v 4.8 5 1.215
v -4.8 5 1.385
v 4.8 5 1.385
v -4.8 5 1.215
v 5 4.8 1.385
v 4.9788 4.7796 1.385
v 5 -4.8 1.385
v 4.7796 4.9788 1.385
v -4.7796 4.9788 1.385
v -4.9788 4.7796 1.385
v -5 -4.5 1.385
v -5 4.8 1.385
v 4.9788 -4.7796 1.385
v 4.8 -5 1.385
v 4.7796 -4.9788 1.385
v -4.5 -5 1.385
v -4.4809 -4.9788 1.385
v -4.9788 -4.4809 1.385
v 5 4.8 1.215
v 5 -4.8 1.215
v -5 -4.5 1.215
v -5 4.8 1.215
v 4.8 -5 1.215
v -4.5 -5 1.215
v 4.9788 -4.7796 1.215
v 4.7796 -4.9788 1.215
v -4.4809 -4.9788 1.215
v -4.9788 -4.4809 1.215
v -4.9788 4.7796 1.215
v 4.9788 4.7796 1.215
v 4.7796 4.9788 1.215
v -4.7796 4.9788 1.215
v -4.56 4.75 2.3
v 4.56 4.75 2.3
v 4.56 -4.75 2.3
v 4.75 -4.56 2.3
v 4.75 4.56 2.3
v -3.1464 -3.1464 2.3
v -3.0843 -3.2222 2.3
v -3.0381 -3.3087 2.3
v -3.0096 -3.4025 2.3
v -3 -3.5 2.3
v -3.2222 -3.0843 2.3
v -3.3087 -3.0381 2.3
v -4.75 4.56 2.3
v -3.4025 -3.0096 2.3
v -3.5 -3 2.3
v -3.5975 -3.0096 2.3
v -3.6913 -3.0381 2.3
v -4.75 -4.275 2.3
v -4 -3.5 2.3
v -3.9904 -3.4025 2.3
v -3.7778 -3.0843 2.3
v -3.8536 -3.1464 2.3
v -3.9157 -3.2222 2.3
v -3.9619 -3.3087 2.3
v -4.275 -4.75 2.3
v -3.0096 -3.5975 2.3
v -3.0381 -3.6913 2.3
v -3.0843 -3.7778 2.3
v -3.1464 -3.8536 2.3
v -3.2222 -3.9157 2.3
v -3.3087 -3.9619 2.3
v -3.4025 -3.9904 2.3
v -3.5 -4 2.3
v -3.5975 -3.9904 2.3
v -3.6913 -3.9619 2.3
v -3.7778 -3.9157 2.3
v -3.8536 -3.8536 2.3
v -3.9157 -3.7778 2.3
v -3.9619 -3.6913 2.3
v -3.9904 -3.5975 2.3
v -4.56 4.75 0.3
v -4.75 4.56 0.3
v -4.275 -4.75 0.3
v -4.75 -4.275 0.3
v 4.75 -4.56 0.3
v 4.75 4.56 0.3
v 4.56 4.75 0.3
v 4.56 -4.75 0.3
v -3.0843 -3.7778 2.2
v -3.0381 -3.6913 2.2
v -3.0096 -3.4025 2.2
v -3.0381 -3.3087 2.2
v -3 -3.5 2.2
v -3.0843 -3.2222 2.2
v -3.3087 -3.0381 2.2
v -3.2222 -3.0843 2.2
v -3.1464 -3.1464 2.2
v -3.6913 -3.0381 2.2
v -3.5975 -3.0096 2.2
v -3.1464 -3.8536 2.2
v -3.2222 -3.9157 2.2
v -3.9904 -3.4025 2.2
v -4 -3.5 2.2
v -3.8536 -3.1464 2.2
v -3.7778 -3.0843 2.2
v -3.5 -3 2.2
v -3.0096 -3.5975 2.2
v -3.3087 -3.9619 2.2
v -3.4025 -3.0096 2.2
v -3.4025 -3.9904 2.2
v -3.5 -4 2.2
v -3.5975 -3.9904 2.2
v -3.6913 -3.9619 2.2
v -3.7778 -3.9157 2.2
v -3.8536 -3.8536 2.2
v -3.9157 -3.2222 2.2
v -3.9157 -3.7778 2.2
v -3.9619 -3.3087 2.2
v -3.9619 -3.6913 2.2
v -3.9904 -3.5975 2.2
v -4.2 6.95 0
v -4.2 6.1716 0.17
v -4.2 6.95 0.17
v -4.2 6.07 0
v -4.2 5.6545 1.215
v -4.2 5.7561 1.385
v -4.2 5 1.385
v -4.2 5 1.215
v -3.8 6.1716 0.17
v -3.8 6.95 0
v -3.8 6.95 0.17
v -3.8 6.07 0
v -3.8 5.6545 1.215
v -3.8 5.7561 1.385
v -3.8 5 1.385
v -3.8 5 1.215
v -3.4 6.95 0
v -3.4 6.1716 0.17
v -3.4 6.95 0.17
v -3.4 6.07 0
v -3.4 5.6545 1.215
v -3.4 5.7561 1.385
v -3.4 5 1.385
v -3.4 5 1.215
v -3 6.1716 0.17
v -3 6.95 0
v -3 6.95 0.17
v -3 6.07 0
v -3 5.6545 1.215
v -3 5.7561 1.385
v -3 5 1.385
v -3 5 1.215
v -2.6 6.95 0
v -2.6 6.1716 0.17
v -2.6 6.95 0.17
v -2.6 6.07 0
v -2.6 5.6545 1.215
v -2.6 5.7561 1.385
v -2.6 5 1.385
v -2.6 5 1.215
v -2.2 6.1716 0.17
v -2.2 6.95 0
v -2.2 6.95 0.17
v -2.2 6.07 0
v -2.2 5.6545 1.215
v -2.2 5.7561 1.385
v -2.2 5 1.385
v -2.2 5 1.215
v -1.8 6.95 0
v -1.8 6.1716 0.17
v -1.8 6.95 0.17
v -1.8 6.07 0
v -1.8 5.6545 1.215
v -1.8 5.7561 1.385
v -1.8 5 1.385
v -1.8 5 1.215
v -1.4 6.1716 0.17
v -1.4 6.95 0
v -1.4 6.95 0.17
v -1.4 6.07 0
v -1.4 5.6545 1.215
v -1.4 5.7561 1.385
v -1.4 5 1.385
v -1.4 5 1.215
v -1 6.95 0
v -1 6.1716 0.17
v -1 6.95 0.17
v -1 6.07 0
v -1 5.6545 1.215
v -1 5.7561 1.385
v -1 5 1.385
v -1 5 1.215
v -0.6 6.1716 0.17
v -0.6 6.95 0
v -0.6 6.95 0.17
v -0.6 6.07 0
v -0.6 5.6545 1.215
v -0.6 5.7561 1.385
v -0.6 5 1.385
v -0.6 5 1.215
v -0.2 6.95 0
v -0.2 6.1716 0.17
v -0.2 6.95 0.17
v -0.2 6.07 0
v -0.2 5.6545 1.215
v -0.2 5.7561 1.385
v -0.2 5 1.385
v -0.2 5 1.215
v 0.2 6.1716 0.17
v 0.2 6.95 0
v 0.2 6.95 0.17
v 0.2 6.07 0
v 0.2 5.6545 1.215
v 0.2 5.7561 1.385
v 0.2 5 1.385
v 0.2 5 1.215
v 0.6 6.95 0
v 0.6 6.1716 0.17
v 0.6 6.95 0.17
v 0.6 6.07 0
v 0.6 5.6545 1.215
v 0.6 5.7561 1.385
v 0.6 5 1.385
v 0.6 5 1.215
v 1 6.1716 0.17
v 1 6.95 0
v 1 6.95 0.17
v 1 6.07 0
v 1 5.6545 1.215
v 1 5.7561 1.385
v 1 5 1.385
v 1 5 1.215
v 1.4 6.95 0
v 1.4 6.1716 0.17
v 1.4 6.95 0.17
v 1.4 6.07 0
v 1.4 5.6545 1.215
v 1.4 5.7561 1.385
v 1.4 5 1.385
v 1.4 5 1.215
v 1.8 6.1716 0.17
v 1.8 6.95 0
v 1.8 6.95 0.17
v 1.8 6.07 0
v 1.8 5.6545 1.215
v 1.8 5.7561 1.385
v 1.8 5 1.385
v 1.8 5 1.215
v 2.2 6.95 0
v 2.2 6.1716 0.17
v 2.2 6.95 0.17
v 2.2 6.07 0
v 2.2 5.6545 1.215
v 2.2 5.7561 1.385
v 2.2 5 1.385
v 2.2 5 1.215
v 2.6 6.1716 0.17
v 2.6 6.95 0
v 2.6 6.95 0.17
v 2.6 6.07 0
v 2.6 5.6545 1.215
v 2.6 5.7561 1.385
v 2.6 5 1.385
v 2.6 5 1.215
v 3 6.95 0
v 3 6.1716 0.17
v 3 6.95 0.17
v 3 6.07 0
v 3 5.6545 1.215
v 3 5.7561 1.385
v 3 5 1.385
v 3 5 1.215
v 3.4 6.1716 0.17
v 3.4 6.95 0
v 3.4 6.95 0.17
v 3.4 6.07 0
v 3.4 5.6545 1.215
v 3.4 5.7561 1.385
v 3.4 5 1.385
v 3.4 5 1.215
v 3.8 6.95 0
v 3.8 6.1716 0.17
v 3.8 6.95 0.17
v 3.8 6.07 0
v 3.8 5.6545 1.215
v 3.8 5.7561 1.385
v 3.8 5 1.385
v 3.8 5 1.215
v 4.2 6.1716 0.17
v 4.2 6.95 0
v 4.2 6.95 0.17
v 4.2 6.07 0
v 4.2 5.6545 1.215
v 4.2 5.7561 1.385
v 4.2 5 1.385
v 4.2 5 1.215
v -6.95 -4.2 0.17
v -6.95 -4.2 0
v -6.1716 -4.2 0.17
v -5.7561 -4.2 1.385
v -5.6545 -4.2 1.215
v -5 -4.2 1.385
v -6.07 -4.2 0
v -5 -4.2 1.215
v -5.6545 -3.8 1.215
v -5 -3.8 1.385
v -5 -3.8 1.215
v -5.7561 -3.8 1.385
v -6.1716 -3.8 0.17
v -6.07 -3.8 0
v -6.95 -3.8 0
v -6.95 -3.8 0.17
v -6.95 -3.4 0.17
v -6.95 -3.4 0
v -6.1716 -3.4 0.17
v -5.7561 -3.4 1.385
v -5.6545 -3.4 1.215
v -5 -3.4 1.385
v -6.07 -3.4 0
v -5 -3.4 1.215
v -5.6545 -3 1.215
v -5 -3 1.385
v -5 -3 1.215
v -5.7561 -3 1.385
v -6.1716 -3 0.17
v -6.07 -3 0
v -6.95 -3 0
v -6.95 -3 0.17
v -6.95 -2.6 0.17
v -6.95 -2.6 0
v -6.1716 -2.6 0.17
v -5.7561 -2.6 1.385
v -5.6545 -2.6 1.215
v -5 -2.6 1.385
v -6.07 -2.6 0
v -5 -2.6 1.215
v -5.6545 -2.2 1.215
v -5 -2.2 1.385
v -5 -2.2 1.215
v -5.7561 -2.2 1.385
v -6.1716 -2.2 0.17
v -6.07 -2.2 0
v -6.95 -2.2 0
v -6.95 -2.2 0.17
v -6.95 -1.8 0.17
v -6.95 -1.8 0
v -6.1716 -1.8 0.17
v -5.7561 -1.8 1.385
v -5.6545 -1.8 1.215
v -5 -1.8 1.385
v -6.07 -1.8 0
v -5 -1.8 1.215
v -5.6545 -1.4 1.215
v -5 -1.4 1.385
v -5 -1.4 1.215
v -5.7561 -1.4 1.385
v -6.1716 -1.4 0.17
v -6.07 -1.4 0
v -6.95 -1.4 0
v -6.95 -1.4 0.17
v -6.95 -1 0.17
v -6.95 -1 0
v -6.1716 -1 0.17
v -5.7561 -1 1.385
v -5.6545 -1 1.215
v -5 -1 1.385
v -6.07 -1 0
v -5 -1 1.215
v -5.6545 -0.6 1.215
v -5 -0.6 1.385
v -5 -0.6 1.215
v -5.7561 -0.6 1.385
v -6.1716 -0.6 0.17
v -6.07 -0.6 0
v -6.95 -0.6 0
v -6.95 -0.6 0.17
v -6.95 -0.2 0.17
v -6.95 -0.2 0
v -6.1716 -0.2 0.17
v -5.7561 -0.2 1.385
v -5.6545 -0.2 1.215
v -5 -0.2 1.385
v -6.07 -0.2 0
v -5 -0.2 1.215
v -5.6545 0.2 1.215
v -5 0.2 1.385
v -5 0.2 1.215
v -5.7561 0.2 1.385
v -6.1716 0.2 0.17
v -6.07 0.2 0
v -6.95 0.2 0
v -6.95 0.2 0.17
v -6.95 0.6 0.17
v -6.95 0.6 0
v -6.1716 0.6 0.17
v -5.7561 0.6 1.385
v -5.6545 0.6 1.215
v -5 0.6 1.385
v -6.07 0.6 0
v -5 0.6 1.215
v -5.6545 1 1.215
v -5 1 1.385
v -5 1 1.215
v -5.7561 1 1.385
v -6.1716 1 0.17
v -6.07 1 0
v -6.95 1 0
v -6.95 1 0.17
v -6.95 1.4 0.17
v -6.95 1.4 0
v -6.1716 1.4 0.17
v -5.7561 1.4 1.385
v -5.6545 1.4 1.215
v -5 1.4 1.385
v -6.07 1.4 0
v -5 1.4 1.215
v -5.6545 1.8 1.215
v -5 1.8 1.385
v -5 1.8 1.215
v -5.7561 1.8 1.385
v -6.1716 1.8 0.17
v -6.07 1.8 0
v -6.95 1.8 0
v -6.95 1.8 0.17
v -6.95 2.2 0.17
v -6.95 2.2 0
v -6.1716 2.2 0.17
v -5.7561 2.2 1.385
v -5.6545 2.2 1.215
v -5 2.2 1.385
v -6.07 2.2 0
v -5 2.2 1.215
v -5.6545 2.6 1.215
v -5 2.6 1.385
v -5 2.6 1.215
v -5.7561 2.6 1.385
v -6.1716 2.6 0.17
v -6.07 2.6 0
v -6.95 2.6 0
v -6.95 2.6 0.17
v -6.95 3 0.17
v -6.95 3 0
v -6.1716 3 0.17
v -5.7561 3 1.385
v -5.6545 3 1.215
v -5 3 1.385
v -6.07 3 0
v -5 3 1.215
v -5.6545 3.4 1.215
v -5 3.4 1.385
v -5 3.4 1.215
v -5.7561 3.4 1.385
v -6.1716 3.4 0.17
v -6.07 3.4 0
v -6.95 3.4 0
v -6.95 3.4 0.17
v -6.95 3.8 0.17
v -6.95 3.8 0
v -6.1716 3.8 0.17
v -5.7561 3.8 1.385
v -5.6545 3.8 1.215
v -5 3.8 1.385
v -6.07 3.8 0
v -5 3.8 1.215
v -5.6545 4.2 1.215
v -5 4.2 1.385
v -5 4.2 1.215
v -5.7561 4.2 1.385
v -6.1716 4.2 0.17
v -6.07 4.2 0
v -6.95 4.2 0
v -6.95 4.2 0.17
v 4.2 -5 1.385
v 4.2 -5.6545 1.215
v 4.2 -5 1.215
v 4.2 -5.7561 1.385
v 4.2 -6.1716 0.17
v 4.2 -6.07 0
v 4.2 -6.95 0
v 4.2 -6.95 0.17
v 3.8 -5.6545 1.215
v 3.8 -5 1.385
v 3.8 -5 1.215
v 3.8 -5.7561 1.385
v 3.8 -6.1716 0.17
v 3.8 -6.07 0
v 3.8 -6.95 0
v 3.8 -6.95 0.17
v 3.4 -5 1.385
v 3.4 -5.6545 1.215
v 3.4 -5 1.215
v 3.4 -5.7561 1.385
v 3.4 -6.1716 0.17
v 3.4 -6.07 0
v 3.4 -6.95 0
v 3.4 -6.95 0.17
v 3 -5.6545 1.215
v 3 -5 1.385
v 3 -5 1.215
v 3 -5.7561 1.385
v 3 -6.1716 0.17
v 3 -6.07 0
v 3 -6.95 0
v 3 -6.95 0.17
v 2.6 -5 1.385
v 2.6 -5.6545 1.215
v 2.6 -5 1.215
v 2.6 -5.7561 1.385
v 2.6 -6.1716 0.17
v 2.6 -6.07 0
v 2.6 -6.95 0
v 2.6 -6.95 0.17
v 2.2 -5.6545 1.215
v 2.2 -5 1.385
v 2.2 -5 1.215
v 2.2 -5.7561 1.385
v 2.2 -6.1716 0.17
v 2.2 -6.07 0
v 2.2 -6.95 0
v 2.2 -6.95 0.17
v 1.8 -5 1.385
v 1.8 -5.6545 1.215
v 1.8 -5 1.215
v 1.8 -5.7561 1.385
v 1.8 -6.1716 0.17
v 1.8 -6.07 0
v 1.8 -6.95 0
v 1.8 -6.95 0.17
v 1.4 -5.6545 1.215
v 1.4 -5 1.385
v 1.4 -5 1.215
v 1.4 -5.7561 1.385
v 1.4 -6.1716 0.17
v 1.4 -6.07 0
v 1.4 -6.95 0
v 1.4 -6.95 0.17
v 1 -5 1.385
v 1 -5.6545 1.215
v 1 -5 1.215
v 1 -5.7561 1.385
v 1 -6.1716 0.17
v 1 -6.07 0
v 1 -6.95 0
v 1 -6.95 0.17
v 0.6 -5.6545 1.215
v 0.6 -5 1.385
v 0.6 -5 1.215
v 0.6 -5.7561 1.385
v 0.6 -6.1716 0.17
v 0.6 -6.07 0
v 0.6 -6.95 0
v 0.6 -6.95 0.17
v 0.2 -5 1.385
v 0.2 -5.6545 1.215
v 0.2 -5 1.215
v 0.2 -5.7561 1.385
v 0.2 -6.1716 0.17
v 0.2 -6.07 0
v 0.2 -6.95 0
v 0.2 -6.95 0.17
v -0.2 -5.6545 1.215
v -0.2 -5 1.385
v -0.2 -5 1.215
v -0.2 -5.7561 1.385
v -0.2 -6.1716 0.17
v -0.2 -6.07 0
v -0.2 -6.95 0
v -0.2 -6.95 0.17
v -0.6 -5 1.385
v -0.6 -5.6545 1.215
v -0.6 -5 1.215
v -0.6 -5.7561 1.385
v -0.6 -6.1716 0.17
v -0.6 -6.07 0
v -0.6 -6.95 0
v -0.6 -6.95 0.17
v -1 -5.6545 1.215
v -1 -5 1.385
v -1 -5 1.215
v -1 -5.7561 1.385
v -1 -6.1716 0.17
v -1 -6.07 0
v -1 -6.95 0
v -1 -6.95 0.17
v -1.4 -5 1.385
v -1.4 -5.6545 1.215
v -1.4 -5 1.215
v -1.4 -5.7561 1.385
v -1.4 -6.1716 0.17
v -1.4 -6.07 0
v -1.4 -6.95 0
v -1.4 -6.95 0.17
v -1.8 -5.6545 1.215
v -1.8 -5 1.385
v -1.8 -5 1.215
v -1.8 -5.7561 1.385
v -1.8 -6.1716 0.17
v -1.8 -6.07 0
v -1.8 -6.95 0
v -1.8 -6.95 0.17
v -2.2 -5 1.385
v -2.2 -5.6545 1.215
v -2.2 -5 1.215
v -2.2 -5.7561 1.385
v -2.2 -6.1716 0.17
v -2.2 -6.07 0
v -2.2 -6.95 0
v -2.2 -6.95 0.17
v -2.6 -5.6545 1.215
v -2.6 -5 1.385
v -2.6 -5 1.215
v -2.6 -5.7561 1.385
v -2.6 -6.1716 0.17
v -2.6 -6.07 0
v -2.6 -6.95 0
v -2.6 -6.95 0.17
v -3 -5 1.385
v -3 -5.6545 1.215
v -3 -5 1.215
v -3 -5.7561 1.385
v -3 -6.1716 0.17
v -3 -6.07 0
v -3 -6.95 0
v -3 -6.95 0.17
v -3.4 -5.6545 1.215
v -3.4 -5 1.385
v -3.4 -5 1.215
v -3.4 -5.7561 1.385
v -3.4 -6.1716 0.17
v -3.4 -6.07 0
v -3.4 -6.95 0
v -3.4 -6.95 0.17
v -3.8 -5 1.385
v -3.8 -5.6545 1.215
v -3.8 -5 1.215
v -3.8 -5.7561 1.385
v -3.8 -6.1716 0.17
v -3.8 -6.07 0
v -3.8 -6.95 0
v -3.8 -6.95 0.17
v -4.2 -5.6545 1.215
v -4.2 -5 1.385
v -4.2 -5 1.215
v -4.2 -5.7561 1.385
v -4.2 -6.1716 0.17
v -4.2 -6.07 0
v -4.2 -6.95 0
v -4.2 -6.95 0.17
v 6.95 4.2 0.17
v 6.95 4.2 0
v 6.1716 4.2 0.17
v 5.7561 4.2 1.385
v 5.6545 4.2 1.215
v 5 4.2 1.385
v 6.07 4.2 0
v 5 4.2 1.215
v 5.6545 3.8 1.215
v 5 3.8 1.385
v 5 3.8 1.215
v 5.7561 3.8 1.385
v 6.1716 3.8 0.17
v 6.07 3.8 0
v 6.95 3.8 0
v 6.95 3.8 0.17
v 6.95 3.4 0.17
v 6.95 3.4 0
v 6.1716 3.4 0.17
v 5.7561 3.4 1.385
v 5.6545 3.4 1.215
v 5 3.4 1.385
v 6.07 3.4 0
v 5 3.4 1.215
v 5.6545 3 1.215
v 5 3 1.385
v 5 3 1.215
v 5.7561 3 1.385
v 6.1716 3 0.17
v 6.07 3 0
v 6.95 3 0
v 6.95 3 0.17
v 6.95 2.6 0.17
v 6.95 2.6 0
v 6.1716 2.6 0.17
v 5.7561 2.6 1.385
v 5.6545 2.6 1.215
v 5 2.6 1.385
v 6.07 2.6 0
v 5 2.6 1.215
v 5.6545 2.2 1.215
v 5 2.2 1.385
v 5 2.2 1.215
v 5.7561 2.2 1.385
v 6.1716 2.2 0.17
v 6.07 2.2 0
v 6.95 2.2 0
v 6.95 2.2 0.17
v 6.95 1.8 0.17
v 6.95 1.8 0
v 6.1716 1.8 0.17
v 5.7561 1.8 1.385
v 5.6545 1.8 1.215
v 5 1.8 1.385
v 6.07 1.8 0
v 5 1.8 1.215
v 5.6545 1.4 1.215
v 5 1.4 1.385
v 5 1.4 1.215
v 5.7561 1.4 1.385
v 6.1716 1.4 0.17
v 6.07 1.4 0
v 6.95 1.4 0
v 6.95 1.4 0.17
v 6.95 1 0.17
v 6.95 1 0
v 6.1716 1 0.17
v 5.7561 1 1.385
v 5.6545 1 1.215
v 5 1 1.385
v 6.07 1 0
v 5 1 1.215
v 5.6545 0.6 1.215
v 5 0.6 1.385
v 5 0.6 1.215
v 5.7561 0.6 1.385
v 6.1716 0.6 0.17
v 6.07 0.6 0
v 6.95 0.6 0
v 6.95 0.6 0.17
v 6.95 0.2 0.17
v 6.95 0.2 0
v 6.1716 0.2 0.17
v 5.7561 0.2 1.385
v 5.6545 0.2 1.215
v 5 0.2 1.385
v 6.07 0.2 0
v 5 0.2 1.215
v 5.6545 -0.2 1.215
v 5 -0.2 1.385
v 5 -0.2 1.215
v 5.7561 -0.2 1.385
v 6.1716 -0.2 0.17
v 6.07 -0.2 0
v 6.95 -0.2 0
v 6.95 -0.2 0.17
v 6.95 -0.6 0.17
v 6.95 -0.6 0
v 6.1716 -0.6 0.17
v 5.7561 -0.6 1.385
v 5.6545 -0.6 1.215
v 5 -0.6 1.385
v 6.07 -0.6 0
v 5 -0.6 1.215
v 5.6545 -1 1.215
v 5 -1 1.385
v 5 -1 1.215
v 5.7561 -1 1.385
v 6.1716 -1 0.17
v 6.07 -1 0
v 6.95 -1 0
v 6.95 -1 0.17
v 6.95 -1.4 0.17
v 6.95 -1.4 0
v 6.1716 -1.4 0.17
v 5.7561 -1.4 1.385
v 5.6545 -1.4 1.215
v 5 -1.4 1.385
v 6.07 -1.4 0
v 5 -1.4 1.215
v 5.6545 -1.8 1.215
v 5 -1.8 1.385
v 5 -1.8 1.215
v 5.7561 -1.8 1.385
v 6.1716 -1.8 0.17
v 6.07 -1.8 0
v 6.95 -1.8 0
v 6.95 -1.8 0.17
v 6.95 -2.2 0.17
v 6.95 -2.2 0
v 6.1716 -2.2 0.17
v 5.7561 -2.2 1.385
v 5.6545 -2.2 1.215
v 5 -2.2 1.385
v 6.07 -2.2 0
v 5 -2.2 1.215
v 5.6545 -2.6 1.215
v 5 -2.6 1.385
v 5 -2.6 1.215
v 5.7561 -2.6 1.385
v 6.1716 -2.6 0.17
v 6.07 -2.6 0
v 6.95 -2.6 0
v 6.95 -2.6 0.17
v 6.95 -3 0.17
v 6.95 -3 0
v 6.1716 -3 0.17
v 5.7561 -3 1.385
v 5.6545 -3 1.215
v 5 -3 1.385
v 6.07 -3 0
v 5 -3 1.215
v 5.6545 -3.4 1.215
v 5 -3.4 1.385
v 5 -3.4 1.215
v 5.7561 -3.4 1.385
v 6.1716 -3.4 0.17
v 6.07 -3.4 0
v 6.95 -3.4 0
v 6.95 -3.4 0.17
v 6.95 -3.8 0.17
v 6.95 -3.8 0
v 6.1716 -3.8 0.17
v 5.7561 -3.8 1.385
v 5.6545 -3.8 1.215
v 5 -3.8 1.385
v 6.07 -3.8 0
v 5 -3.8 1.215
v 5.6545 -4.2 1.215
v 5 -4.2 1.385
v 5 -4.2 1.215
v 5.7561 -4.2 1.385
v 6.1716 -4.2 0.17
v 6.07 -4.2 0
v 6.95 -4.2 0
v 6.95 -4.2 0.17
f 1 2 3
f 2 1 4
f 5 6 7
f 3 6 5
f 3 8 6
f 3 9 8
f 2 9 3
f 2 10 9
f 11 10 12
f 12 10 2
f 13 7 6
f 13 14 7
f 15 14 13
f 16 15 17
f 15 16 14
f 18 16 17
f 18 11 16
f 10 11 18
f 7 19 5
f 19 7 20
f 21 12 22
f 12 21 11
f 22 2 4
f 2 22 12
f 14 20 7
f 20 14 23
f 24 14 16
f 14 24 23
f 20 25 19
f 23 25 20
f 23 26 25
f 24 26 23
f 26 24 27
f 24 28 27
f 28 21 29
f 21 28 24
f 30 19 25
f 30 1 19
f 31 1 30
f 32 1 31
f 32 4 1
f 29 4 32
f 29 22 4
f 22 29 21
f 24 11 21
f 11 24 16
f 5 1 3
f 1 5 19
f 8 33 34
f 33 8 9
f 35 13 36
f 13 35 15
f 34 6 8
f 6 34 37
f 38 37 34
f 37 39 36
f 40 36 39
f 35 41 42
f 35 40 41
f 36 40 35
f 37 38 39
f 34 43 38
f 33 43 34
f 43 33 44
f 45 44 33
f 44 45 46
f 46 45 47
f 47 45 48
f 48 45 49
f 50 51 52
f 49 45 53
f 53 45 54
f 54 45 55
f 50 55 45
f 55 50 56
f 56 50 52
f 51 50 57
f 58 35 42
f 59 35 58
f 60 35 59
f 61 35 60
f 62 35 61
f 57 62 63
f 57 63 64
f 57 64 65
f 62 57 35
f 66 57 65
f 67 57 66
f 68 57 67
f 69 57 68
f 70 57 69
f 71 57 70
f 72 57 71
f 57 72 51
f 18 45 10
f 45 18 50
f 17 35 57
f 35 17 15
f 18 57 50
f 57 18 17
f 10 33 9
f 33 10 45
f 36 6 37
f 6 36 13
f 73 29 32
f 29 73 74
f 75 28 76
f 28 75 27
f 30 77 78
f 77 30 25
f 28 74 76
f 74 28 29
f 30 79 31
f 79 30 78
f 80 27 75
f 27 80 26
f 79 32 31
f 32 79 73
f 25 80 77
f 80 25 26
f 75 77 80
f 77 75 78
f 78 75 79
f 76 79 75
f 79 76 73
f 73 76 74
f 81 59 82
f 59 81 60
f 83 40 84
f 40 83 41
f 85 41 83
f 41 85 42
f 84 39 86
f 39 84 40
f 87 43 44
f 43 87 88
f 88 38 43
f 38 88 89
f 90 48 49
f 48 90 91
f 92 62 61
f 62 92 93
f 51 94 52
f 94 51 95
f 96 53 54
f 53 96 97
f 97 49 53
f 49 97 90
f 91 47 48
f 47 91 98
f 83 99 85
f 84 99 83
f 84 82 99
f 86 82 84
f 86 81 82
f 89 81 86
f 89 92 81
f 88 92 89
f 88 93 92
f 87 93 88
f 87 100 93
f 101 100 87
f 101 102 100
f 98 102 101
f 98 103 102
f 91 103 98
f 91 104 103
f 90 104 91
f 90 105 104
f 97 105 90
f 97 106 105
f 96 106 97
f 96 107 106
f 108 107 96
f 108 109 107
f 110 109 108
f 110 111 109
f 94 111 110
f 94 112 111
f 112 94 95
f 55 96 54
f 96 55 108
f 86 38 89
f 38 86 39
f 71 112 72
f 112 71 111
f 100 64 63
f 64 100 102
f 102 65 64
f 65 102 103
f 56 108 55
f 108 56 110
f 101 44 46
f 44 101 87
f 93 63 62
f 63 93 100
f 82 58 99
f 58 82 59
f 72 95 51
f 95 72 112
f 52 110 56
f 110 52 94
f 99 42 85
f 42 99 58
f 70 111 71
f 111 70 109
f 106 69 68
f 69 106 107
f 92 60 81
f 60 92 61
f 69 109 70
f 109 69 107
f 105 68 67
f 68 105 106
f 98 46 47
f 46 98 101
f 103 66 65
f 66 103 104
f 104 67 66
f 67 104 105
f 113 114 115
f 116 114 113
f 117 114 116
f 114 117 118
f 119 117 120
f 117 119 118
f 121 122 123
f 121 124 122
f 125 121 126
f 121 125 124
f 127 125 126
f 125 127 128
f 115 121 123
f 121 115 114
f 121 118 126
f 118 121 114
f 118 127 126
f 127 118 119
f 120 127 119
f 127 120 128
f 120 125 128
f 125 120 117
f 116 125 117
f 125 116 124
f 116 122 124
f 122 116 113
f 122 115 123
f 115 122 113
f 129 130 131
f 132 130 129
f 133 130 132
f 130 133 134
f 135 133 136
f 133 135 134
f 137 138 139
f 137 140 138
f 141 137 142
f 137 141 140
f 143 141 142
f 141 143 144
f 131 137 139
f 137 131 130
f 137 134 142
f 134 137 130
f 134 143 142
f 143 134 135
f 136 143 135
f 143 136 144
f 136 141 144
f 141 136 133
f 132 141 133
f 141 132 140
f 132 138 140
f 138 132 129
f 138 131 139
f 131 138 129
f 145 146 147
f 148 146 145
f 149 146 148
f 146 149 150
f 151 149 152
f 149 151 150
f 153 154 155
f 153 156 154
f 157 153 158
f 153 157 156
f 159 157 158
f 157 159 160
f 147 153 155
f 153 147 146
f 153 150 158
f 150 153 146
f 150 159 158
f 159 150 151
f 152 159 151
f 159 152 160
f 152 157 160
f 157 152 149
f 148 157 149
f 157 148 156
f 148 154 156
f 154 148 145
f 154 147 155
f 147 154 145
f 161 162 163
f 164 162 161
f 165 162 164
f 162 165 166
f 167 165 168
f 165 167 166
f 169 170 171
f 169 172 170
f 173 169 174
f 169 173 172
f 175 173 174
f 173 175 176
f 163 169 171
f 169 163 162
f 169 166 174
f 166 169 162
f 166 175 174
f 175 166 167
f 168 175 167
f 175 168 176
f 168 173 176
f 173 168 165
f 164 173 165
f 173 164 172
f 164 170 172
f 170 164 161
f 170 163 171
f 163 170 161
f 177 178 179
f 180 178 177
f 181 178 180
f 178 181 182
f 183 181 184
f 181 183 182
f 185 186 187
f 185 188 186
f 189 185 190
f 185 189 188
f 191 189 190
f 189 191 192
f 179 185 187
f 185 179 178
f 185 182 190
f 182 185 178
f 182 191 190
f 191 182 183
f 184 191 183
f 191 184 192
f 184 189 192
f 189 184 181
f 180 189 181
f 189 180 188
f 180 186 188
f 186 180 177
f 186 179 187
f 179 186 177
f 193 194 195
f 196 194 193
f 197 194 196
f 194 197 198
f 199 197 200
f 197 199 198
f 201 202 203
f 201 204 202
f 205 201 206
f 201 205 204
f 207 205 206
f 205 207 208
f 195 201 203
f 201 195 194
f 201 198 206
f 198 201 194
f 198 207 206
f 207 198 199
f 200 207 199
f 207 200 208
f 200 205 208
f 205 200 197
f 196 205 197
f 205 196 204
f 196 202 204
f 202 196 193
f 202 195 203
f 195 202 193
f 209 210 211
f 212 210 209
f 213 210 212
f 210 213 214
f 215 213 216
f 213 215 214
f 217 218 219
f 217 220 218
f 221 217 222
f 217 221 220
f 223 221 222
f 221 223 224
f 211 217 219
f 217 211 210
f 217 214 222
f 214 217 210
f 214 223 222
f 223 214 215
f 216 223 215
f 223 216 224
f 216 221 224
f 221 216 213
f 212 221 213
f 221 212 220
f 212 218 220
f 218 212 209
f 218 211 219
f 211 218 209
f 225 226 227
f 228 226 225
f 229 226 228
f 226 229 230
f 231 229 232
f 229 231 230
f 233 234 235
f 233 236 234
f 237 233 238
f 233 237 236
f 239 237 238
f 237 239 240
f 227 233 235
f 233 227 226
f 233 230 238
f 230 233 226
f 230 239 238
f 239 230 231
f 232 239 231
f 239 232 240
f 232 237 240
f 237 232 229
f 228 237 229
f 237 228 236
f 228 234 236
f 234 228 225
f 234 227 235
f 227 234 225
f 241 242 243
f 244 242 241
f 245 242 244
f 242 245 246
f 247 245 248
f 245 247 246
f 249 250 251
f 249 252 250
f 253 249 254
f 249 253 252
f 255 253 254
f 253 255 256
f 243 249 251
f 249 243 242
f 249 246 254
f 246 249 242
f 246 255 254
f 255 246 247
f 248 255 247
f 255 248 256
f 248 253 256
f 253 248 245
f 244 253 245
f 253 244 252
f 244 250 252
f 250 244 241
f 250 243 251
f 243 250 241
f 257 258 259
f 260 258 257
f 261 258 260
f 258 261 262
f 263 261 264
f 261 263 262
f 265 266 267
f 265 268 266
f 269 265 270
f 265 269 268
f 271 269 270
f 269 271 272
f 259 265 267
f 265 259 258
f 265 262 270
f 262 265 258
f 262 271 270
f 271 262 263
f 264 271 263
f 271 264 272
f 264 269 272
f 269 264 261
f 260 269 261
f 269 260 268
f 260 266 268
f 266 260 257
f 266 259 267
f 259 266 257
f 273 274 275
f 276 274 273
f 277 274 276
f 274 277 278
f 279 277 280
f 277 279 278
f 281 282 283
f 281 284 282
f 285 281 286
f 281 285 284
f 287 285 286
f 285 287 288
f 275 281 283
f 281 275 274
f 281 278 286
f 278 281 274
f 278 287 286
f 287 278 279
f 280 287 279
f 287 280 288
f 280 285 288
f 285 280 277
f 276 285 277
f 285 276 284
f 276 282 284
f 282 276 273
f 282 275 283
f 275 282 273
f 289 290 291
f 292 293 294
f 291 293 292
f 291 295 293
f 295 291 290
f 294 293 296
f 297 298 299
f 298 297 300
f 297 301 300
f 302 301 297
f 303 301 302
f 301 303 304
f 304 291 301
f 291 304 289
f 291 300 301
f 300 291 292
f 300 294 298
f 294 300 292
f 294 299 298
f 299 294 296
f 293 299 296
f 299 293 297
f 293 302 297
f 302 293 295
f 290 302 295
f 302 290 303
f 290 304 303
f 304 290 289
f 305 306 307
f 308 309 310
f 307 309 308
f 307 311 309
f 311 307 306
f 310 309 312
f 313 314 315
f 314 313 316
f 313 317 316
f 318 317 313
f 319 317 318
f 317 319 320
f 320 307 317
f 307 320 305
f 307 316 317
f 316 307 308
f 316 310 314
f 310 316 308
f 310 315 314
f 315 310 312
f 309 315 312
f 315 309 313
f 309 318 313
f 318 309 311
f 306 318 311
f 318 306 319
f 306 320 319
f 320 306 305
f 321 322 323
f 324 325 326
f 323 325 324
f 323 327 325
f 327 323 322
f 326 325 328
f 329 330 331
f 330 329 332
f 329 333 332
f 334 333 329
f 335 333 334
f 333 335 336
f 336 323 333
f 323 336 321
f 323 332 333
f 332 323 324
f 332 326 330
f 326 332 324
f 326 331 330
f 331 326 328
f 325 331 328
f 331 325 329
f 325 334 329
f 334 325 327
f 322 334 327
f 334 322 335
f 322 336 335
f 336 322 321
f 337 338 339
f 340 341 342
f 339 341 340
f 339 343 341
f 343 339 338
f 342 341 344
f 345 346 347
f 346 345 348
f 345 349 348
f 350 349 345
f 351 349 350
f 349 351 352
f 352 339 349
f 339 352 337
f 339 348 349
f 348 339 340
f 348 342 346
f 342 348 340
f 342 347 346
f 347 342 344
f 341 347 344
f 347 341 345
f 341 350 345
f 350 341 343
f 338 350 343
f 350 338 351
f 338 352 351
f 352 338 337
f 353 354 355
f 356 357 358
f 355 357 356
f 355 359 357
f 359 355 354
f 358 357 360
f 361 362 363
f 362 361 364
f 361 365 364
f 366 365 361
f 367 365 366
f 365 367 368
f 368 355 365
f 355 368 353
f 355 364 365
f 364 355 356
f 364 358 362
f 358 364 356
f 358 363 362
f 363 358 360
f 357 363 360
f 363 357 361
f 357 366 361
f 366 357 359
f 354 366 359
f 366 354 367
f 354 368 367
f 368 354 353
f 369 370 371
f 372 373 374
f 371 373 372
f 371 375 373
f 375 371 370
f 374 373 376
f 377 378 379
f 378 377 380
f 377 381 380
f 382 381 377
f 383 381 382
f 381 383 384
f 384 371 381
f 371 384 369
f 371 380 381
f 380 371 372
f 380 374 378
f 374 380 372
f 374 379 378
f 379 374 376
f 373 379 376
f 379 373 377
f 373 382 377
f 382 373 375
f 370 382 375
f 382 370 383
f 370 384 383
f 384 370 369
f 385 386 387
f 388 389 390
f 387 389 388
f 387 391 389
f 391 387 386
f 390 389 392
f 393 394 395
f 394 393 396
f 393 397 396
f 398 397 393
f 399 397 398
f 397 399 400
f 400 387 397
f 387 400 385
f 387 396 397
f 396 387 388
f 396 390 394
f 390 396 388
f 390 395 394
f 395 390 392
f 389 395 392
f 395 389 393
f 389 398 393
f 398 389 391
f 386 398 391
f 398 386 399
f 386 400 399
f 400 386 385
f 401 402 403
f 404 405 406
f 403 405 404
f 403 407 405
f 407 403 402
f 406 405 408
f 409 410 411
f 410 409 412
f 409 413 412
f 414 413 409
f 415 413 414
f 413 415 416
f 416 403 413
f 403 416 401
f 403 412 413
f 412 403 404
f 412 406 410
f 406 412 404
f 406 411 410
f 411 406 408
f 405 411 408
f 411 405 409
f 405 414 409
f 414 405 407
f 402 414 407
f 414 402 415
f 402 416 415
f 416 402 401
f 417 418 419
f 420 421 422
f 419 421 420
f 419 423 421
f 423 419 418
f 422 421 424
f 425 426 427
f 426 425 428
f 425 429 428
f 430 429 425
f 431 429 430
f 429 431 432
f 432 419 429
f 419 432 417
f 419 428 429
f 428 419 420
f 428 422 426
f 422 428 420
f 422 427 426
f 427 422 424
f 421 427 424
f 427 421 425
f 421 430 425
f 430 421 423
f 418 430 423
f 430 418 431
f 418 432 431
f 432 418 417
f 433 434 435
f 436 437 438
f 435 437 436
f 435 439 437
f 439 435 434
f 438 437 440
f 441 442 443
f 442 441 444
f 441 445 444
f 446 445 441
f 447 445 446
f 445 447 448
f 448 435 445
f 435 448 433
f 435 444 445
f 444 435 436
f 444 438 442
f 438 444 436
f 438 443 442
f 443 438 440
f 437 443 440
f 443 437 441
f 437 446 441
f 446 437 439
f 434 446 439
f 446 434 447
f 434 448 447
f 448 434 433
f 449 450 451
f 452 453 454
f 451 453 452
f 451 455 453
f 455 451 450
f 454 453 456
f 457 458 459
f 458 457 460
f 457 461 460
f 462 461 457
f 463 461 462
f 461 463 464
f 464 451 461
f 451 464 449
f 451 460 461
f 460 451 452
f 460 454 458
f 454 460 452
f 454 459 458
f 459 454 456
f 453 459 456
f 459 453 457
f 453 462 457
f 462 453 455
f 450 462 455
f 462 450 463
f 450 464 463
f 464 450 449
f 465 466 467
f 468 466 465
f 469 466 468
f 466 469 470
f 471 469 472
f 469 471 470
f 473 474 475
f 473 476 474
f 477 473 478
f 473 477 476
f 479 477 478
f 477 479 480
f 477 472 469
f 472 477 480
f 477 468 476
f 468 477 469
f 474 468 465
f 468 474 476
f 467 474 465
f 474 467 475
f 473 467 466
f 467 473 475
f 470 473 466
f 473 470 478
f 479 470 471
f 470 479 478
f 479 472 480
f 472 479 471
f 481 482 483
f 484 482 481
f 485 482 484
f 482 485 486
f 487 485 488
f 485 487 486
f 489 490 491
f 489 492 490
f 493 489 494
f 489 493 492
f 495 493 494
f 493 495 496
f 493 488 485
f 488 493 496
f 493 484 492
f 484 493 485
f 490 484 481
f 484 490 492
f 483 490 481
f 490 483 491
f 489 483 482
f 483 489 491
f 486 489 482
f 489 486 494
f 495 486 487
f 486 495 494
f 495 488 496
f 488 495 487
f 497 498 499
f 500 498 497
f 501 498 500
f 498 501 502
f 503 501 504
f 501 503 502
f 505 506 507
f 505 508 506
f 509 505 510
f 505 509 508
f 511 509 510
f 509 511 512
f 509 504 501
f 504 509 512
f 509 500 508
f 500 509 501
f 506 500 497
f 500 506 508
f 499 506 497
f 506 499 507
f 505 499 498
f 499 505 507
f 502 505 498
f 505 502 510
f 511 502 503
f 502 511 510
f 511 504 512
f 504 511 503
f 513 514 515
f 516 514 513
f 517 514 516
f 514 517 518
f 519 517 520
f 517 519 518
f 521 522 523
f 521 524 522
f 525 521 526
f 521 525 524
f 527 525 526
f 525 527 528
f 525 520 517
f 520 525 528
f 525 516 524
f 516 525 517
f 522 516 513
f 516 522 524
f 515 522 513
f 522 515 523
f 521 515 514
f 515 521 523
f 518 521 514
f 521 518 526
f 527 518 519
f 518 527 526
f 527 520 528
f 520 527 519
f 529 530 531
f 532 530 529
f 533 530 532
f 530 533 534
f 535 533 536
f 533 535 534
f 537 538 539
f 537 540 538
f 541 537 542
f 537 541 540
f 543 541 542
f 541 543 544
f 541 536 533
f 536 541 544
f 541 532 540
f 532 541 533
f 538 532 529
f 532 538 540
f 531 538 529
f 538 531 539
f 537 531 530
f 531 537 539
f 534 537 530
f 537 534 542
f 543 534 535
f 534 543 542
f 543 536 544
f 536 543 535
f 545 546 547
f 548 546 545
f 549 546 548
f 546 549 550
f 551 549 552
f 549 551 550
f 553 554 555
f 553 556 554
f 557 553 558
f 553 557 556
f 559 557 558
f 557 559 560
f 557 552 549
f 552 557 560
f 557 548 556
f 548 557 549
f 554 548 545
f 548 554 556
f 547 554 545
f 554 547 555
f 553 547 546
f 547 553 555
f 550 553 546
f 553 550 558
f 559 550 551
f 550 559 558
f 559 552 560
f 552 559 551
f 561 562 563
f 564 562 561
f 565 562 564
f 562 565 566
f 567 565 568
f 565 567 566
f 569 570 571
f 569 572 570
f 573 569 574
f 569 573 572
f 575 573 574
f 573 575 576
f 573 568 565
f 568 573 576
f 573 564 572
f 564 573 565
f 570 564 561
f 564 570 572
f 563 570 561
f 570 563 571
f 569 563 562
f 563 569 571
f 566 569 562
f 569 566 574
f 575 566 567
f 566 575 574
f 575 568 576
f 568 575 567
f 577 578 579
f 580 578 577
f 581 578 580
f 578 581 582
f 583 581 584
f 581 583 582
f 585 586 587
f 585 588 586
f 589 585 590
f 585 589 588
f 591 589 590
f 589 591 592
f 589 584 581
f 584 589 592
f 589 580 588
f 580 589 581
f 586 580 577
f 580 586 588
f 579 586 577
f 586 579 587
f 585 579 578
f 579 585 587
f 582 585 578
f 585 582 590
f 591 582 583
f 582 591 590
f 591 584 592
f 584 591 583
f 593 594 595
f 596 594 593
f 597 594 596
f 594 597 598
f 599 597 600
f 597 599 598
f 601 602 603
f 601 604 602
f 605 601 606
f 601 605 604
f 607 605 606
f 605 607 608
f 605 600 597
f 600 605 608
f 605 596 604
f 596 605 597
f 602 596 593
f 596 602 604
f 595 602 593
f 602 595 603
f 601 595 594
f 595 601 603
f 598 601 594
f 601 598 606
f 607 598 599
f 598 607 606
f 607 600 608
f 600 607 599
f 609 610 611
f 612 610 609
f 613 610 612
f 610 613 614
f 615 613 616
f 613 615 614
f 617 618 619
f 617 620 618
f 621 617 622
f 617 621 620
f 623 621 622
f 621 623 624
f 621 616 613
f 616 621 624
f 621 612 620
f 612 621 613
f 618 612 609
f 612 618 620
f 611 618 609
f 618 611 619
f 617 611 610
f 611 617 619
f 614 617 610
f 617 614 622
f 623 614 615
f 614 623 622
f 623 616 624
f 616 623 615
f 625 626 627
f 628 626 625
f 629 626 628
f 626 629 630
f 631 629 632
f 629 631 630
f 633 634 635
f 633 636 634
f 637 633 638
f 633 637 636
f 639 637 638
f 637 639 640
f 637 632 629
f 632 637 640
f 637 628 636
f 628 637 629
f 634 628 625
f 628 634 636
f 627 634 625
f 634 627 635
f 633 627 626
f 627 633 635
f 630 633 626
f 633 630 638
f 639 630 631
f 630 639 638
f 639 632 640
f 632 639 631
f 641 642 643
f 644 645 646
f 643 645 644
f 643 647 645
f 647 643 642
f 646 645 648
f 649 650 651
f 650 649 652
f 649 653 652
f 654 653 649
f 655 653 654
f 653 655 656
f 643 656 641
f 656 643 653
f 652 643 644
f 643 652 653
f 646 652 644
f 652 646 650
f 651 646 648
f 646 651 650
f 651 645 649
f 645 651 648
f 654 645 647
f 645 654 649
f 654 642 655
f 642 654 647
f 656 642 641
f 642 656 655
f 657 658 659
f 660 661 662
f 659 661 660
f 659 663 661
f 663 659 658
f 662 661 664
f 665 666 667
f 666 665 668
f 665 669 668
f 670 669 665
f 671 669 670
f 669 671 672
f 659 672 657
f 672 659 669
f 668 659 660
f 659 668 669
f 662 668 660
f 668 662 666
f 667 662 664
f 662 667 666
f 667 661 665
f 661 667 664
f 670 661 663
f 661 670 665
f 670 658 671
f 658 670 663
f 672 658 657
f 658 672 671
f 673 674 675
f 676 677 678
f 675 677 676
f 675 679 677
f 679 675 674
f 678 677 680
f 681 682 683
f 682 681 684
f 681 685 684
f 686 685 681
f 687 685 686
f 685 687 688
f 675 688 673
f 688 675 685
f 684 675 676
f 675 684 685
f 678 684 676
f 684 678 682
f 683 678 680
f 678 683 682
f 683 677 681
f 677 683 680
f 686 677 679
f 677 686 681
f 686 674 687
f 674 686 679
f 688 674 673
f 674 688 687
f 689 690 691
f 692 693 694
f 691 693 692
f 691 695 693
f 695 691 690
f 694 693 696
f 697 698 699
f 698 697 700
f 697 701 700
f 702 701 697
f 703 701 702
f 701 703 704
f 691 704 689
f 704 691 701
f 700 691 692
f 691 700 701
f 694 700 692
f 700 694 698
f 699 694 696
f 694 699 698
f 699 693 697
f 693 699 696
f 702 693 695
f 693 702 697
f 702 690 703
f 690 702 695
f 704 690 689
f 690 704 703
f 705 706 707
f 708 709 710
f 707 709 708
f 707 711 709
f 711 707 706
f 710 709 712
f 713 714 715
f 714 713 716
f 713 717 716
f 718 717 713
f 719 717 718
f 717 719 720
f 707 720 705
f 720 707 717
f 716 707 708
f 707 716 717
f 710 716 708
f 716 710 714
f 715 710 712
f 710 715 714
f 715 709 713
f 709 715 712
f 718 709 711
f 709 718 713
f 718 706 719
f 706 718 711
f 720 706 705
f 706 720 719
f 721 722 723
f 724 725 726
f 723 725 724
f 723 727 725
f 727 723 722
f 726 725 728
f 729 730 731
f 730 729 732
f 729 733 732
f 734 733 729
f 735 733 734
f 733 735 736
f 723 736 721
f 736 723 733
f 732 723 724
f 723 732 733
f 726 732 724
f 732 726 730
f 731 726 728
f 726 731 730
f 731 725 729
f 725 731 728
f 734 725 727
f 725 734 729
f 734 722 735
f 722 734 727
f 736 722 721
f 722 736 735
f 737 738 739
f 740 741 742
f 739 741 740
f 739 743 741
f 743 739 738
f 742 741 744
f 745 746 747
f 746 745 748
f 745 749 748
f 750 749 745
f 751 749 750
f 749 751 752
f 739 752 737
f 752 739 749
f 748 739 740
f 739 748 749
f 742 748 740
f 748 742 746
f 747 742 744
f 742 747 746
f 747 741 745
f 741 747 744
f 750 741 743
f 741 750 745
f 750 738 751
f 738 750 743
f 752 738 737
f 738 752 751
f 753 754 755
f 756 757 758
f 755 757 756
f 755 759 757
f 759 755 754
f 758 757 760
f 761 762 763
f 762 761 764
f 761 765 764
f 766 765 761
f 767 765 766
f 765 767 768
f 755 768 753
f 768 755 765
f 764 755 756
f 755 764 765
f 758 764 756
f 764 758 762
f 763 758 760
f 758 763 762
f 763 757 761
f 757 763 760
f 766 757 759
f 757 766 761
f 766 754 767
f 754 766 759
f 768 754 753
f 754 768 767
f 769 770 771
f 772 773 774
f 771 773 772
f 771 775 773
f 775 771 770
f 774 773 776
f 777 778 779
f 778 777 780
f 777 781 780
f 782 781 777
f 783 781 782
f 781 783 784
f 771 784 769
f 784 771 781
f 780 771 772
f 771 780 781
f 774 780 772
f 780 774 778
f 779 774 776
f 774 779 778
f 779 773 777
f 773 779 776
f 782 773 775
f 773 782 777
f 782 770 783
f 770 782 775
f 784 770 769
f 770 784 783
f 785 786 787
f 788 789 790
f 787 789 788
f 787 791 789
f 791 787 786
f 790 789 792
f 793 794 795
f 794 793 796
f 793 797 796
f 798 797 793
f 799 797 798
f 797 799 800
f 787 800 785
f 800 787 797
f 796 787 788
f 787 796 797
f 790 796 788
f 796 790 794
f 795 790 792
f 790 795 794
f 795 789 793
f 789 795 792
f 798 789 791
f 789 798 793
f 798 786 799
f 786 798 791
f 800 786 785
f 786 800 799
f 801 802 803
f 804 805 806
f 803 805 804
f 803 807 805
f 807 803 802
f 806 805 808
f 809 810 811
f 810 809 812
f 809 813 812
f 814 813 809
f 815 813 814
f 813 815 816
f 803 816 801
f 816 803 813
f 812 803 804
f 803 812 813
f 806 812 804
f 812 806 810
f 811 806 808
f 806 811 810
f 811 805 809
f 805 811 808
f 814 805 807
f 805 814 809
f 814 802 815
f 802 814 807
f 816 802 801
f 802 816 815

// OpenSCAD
pins = 44;
pin_pitch = 0.8;
pin_width = 0.4;
pin_seating = 0.88;
pin_gull_angle = 20;
leadframe_thickness = 0.17;

overall_width = 13.9;
overall_length = 13.9;
body_width = 10;
body_length = 10;
body_thickness = 2;

total_thickness = 2.3;

body_bevel = 0.5;
body_chamfer = 0.2;
body_chamfer_index = 0.5;


leadframe_height = total_thickness - body_thickness/2;

index_mark_offset = min(min(body_width, body_length) * 0.4, 1.5);
index_mark_radius = min(index_mark_offset / 3, 0.5);


difference() {
    body();
    color("#ddd") translate([
        -body_length / 2 + index_mark_offset,
        -body_width / 2 + index_mark_offset,
        total_thickness - 0.1,
    ]) cylinder(h = 10, r = index_mark_radius, $fn=32);
}


translate([pin_pitch * ((pins / 4) - 1) / -2, overall_width / 2, 0]) for(n = [0 : pins / 4 - 1]) {
    translate([pin_pitch * n, 0, 0]) pin();
}
rotate([0, 0, 90]) translate([pin_pitch * ((pins / 4) - 1) / -2, overall_width / 2, 0]) for(n = [0 : pins / 4 - 1]) {
    translate([pin_pitch * n, 0, 0]) pin();
}
rotate([0, 0, 180]) translate([pin_pitch * ((pins / 4) - 1) / -2, overall_width / 2, 0]) for(n = [0 : pins / 4 - 1]) {
    translate([pin_pitch * n, 0, 0]) pin();
}
rotate([0, 0, 270]) translate([pin_pitch * ((pins / 4) - 1) / -2, overall_width / 2, 0]) for(n = [0 : pins / 4 - 1]) {
    translate([pin_pitch * n, 0, 0]) pin();
}

module pin() {
    color("#999") rotate([90, 0, 90]) linear_extrude(height = pin_width, center = true) {
        gull_offset = leadframe_height - leadframe_thickness / 2;
        pin_length = (overall_width - body_width) / 2;
        sine = sin(pin_gull_angle);
        cosine = cos(pin_gull_angle);
        polygon([
            [0, 0],
            [-pin_seating, 0],
            [-pin_seating - sine * gull_offset, gull_offset],
            [-pin_length, gull_offset],
            [-pin_length, gull_offset + leadframe_thickness],
            [-pin_seating - sine * (gull_offset + leadframe_thickness) + cosine * leadframe_thickness, gull_offset + leadframe_thickness],
            [-pin_seating - sine * leadframe_thickness + cosine * leadframe_thickness, leadframe_thickness],
            [0, leadframe_thickness],
        ]);
    }
}


module body() {
    color("#555") translate([0, 0, leadframe_height]) {
        linear_extrude(height = leadframe_thickness, center = true) body_outline();
        linear_extrude(
            height = body_thickness / 2,
            scale = [(body_length - body_bevel) / body_length, (body_width - body_bevel) / body_width]
        ) body_outline();
        
        scale([1, 1, -1]) linear_extrude(
            height = body_thickness / 2,
            scale = [(body_length - body_bevel) / body_length, (body_width - body_bevel) / body_width]
        ) body_outline();
    }
}
module body_outline() {
    polygon([
        [ -body_length/2 + body_chamfer_index, -body_width/2 ],
        [ -body_length/2               , -body_width/2 + body_chamfer_index ],
        [ -body_length/2               , +body_width/2 - body_chamfer ],
        [ -body_length/2 + body_chamfer, +body_width/2 ],
        [ +body_length/2 - body_chamfer, +body_width/2 ],
        [ +body_length/2               , +body_width/2 - body_chamfer ],
        [ +body_length/2               , -body_width/2 + body_chamfer ],
        [ +body_length/2 - body_chamfer, -body_width/2 ],
    ]);
}
